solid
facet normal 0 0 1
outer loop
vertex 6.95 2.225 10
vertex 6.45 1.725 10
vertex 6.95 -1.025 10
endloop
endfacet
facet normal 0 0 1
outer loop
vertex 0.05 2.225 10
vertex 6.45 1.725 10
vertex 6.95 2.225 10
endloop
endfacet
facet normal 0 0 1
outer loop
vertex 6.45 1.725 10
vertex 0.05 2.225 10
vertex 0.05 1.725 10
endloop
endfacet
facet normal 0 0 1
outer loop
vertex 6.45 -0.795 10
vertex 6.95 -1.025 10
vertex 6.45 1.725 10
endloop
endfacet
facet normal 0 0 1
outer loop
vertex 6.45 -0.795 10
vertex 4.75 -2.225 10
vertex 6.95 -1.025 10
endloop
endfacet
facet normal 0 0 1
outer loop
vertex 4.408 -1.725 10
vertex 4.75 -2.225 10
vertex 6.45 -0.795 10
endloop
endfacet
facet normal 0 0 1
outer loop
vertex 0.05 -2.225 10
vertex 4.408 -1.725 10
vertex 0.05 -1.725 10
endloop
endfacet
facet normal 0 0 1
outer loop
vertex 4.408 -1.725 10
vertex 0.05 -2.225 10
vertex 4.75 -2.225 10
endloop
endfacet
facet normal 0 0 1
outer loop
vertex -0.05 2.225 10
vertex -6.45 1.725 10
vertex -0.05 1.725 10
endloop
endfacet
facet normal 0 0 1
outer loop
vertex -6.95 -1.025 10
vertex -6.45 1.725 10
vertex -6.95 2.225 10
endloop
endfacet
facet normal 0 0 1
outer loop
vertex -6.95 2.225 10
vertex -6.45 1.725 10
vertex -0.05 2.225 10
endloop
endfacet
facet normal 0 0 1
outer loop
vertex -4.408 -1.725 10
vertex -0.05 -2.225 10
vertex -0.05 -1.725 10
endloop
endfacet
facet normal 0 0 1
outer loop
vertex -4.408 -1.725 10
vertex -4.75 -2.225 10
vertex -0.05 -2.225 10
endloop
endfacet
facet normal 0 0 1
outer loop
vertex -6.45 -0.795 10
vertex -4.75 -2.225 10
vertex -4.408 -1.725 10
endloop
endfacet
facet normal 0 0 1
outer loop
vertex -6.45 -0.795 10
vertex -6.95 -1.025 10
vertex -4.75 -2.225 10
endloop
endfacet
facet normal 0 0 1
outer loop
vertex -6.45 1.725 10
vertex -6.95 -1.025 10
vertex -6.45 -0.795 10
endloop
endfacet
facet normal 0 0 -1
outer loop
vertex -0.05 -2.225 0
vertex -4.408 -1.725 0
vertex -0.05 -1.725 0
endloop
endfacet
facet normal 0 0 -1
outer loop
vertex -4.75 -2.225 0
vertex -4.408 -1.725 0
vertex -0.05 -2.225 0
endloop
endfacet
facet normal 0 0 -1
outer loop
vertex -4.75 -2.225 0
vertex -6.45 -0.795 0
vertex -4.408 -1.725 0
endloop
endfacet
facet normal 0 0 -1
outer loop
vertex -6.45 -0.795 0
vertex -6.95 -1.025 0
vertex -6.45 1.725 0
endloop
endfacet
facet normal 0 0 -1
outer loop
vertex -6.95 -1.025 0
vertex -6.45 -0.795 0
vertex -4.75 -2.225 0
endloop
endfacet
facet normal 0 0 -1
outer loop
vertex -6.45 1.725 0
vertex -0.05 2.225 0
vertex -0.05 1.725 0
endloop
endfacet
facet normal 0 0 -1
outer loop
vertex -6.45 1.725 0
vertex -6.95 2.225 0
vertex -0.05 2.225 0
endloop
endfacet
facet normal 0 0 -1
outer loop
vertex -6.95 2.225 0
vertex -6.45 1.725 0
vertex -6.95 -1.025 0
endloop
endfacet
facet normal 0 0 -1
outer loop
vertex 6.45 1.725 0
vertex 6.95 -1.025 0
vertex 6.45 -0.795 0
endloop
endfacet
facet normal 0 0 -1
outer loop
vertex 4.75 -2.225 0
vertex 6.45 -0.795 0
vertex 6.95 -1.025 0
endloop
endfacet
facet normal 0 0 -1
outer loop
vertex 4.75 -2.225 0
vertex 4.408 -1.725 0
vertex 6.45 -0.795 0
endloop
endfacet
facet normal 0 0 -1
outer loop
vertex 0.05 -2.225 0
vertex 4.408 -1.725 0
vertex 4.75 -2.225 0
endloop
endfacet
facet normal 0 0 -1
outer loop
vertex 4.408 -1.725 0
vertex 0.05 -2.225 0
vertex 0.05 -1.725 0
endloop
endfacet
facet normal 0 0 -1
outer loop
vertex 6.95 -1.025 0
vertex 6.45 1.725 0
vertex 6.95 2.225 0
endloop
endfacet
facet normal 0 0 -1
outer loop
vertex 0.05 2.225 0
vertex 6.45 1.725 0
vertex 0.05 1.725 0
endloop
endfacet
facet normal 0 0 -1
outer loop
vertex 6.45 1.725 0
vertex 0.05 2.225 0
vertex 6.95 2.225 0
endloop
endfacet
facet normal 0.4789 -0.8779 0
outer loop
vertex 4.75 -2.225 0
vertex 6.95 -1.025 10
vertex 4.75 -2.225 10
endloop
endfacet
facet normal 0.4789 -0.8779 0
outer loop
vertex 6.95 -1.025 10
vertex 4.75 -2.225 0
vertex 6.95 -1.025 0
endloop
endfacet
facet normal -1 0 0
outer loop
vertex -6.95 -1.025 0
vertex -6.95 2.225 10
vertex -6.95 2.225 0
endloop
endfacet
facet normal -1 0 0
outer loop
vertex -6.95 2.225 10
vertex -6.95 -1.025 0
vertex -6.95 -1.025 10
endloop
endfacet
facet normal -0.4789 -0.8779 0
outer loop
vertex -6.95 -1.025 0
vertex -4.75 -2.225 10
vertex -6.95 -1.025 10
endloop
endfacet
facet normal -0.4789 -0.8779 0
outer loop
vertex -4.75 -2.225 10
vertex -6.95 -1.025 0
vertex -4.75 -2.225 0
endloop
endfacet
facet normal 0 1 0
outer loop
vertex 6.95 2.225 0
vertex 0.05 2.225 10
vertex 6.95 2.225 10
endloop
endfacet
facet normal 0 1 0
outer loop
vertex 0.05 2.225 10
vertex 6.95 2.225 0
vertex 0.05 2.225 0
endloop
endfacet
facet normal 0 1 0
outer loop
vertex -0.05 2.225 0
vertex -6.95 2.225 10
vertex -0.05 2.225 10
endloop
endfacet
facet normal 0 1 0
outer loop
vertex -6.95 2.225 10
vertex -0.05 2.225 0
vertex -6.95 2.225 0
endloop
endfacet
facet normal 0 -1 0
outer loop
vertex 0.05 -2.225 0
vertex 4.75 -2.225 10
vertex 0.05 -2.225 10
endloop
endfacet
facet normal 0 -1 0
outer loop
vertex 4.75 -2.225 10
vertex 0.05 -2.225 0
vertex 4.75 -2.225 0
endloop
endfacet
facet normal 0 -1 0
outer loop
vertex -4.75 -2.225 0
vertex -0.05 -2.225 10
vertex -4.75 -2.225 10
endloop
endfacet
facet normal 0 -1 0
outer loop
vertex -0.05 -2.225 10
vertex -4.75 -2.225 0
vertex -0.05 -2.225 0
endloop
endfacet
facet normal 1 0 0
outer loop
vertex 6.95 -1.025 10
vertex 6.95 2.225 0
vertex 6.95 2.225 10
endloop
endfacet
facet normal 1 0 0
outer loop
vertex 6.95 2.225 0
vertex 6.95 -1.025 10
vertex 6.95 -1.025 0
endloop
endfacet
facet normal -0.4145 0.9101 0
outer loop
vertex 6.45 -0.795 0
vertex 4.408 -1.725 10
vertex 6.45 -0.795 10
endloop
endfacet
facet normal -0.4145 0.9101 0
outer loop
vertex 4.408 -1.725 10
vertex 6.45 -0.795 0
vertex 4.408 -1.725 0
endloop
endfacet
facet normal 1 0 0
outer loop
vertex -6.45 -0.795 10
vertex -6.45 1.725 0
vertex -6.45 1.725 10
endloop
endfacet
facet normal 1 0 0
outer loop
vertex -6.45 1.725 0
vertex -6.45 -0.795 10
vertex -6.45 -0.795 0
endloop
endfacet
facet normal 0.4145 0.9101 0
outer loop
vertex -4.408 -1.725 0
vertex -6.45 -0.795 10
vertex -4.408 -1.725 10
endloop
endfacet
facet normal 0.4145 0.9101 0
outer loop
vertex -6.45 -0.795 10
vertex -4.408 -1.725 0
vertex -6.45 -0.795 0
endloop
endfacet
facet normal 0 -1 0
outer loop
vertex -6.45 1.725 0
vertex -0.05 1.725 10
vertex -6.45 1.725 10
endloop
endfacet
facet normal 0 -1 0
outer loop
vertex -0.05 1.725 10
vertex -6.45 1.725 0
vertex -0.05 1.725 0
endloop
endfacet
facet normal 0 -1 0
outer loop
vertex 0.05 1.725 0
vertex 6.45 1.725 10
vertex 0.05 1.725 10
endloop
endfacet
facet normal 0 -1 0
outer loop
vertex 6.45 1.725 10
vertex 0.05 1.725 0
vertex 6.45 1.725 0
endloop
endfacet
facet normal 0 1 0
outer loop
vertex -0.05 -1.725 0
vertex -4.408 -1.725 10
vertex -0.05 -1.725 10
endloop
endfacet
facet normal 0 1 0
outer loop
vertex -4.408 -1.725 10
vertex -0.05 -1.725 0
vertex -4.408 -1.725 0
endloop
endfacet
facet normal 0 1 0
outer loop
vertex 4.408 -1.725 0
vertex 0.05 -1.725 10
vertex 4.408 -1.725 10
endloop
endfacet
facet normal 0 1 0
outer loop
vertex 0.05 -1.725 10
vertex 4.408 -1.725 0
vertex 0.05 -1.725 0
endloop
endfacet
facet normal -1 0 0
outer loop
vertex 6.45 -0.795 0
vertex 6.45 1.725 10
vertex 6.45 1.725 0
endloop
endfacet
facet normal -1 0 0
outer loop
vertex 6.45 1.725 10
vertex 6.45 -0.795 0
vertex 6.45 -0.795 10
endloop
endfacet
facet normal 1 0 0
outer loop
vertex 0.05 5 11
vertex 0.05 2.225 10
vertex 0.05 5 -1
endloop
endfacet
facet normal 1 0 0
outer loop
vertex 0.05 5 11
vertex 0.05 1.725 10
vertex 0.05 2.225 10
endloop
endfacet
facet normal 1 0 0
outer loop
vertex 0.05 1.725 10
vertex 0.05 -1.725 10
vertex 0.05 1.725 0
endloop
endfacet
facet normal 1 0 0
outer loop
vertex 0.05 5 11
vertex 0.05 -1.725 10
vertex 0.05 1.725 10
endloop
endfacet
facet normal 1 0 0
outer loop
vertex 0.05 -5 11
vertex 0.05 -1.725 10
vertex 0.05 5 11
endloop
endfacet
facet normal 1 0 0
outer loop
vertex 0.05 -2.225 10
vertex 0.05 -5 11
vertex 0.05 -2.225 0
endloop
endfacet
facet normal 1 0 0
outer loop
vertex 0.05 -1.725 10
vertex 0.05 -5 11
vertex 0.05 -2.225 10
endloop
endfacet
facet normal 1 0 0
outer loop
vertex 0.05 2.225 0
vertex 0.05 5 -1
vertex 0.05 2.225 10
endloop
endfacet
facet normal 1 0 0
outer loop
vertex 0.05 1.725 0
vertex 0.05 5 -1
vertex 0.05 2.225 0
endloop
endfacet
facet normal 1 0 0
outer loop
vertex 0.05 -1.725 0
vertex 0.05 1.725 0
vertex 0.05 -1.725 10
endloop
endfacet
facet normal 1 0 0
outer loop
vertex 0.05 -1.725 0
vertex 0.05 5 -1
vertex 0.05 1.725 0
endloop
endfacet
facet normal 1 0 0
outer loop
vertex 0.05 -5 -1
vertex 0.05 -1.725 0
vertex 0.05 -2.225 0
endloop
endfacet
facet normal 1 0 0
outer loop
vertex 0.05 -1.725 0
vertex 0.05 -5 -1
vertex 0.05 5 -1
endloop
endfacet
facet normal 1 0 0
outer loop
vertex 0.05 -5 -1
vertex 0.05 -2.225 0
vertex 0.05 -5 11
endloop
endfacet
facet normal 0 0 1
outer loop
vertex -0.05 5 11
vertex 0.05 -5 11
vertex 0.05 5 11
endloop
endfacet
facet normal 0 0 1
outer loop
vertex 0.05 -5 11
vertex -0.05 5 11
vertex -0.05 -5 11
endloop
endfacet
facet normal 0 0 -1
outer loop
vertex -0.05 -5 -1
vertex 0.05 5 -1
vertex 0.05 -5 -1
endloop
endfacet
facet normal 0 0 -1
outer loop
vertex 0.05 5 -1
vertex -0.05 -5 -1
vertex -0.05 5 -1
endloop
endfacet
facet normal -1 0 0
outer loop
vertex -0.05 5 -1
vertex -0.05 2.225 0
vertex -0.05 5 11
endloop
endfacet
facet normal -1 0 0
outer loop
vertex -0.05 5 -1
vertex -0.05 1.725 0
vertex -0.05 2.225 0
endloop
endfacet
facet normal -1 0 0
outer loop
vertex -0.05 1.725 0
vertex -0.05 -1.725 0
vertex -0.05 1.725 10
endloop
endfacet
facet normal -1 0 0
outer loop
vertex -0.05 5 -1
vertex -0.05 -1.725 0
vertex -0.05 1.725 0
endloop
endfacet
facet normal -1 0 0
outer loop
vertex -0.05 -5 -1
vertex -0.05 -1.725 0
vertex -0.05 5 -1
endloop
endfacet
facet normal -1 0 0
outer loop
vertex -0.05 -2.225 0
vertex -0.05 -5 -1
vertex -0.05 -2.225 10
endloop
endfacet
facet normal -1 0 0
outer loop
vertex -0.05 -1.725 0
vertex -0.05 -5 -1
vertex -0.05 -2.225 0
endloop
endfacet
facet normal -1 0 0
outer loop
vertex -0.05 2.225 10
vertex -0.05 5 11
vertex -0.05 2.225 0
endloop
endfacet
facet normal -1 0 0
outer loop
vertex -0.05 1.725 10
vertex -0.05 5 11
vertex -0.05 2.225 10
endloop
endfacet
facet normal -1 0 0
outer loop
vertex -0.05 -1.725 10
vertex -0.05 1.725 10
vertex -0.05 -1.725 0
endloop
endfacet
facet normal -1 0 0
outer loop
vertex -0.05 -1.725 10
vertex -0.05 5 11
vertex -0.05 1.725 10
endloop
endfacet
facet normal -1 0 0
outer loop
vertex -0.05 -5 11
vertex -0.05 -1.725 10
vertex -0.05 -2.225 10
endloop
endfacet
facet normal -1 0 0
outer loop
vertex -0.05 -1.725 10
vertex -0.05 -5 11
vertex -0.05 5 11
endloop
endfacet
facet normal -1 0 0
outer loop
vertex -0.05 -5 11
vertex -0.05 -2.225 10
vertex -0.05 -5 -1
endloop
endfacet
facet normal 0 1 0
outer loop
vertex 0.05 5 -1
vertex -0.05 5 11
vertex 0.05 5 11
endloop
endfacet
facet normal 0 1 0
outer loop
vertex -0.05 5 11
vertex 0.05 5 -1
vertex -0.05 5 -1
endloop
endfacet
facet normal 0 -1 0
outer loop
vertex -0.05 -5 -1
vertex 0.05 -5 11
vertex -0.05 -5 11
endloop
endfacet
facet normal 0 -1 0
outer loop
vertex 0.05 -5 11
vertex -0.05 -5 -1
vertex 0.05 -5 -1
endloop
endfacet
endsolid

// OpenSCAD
// HDMI Type A Plug Shell
// Dimensions are in mm

$fn = 50;

// パラメータ設定
width_top = 13.9;
width_bottom = 9.5;
height = 4.45;
depth = 10.0;
wall_thickness = 0.5; // 外殻の厚み（中空にする場合）

module hdmi_plug_solid() {
    // 断面の座標計算
    // 中心を原点(0,0)にするためのオフセット
    x1 = width_top / 2;
    x2 = width_bottom / 2;
    y1 = height / 2;
    y2 = -height / 2;

    linear_extrude(height = depth) {
        polygon(points = [
            [-x1,  y1], // 左上
            [ x1,  y1], // 右上
            [ x1,  y2 + 1.2], // 右側面（垂直部分の終わり）
            [ x2,  y2], // 右下（傾斜の終わり）
            [-x2,  y2], // 左下（傾斜の始まり）
            [-x1,  y2 + 1.2]  // 左側面（垂直部分の始まり）
        ]);
    }
}

// 実行（中空のシェルとして作成）
difference() {
    hdmi_plug_solid();
    
    // 内部をくり抜く（必要に応じて）
    translate([0, 0, -1])
        scale([(width_top-wall_thickness*2)/width_top, (height-wall_thickness*2)/height, 1.2])
            hdmi_plug_solid();
}

// ガイド用の中心線（デバッグ用）
#translate([0,0,depth/2]) cube([0.1, 10, depth+2], center=true);
